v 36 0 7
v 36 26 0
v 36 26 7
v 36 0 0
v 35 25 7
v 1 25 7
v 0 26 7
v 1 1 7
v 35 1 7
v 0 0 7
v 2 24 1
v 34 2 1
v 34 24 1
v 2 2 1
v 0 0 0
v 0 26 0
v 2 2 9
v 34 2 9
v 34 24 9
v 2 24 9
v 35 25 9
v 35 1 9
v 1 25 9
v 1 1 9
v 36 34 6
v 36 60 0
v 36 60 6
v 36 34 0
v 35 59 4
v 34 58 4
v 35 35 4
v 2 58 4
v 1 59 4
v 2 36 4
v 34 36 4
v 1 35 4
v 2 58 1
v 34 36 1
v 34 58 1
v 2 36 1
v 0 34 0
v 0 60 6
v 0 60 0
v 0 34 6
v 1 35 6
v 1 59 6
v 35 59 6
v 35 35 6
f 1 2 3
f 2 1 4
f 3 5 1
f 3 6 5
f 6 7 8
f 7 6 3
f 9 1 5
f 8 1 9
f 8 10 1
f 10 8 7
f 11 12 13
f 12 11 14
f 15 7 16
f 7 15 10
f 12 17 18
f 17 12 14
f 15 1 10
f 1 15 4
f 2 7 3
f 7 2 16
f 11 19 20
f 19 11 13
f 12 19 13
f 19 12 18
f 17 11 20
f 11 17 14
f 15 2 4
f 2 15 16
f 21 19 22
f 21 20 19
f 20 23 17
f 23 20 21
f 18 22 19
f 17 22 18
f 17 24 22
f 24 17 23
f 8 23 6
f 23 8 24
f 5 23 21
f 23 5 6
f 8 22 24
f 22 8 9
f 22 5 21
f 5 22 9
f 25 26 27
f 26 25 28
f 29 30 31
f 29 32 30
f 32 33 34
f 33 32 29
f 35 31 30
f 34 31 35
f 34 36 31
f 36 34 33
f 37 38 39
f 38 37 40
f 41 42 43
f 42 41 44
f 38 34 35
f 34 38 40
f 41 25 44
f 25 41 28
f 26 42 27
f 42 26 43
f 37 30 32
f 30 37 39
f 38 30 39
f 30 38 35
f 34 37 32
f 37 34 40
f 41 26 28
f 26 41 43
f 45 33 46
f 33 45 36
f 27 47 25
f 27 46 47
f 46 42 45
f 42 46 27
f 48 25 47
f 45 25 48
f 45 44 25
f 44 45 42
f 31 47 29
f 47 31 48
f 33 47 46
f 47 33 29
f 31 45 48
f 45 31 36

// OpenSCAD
/*
***************************************************************************  
**  Yet Another Parameterised Projectbox library
**
**  Version "v0.9 (30-12-2021)"
**
**  Copyright (c) 2021, 2022 Willem Aandewiel
**
**  TERMS OF USE: MIT License. See bottom offile.                                                            
***************************************************************************      
*/
//---------------------------------------------------------
// This design is parameterized based on the size of a PCB.
//---------------------------------------------------------
// Note: length/lengte refers to X axis, 
//       width/breedte to Y, 
//       height/hoogte to Z

/*
      padding-back|<------pcb length --->|<padding-front
                            RIGHT
        0    X-as ---> 
        +----------------------------------------+   ---
        |                                        |    ^
        |                                        |   padding-right 
        |                                        |    v
        |    -5,y +----------------------+       |   ---              
 B    Y |         | 0,y              x,y |       |     ^              F
 A    - |         |                      |       |     |              R
 C    a |         |                      |       |     | pcb width    O
 K    s |         |                      |       |     |              N
        |         | 0,0              x,0 |       |     v              T
      ^ |    -5,0 +----------------------+       |   ---
      | |                                        |    padding-left
      0 +----------------------------------------+   ---
        0    X-as --->
                          LEFT
*/

//-- whitch half do you want to print?
printTop          = true;
printBottom       = true;

//-- Edit these parameters for your own board dimensions
wall_thickness        = 2.0;
bottomPlane_thickness = 1.0;
topPlane_thickness    = 1.0;

//-- Total height of box = bottomPlane_thickness + topPlane_thickness 
//--                     + bottomWall_height + topWall_height
bottomWall_height = 6;
topWall_height    = 5;

//-- ridge where bottom and top off box can overlap
//-- Make sure this isn't less than topWall_height
ridge_height      = 2;


//-- pcb dimensions
pcb_length        = 30;
pcb_width         = 20;
pcb_thickness     = 1.5;

//-- How much the PCB needs to be raised from the bottom
//-- to leave room for solderings and whatnot
standoff_height   = 4.0;
pin_diameter      = 1.0;
standoff_diameter = 3;
                            
//-- padding between pcb and inside wall
padding_front = 1;
padding_back  = 1;
padding_right = 1;
padding_left  = 1;


//-- D E B U G ----------------------------
show_side_by_side = true;       //-> true
showTop           = true;       //-> true
colorTop          = "yellow";   
showBottom        = true;       //-> true
colorBottom       = "white";
showPCB           = false;      //-> false
showMarkers       = false;      //-> false
intersect         = 0;  //-> 0=none (>0 from front, <0 from back)
//-- D E B U G ----------------------------

/*
********* don't change anything below this line ***************
*/

//-- constants, do not change
yappRectOrg       = 0;
yappRectCenter    = 1;
yappCircleCenter  = 2;
yappBoth          = 0;
yappTopOnly       = 1;
yappBottomOnly    = 2;
yappHole          = 0;
yappPin           = 1;

//-- pcb_standoffs  -- origin is pcb-0,0
pcbStands = [//[ [0]posx, [1]posy
             //       , [2]{yappBoth|yappTopOnly|yappBottomOnly}
             //       ,  [3]{yappHole|yappPin} ]
//               [3,  3, yappBoth, yappHole] 
//              ,[3,  pcb_width-3, yappBoth, yappPin]
             ];

//-- front plane  -- origin is pcb-0,0 (red)
cutoutsFront = [//[ [0]pcb_y, [1]pcb_z, [2]width, [3]height
                //      , [4]{yappRectOrg | yappRectCenterd | yappCircleCenter} ]
//                 [(pcb_width/2)-(12/2), -5, 12, 9, yappRectOrg]
//               , [10, 0, 12.5, 7, yappCircleCenter]
                ];

//-- back plane   -- origin is pcb-0,0 (blue)
cutoutsBack = [//[ [0]pcb_y, [1]pcb_z, [2]width, [3]height
               //     , [4]{yappRectOrg | yappRectCenterd | yappCircleCenter} ]
//                  [0, 0, 8, 5]
//                , [0, 2, 8, 5]
               ];

//-- top plane    -- origin is pcb-0,0
cutoutsTop = [//[ [0]pcb_x,  [1]pcb_y, [2]width, [3]length
              //    , [4]{yappRectOrg | yappRectCenterd | yappCircleCenter} ]
//                  [0, 6, (pcb_length-12), 4, yappRectOrg]
//                , [pcb_width-4, 6, pcb_length-12, 4, yappCircel]
//             // , [0, 5, 8, 4, yappRectCenter]
              ];

//-- bottom plane -- origin is pcb-0,0
cutoutsBottom = [//[ pcb_x,  pcb_y, width, length
                 //   , [4]{yappRectOrg | yappRectCenter | yappCircleCenter} ]
//                   [0, 6, (pcb_length-12), 5, true]
//                 , [pcb_width-5, 6, pcb_length-12, 5, false]
                 ];

//-- left plane   -- origin is pcb-0,0
cutoutsLeft = [//[[0]x_pos,  [1]z_pos, [2]width, [3]height ]
               //   , [4]{yappRectOrg | yappRectCenter | yappCircleCenter} ]
//                [0, 10, 5, 2]
//              , [pcb_length-5, 6, 7,7]
               ];

//-- right plane   -- origin is pcb-0,0
cutoutsRight = [//[[0]x_pos,  [1]z_pos, [2]width, [3]height ]
               //   , [4]{yappRectOrg | yappRectCenter | yappCircleCenter} ]
//                 [0, 1, 5, 2]
                 ];

//-- origin of labels is box [0,0]
labelsTop = [// [ x_pos, y_pos, orientation, size, "text" ]
              [10, 10, 0, 5, "TextLabel" ]
            ];

//-------------------------------------------------------------------

// Calculated globals
//pin_height = bottomWall_height + topWall_height - standoff_height; 

module pcb(posX, posY, posZ)
{
  difference()
  {
    translate([posX, posY, posZ])
    {
      color("red", 0.1)
        cube([pcb_length, pcb_width, pcb_thickness]);
    
      if (showMarkers)
      {
        markerHeight=bottomPlane_thickness+bottomWall_height+pcb_thickness;
    
        translate([0, 0, 0])
          color("black")
            %cylinder(
              r = .5,
              h = markerHeight,
              center = true,
              $fn = 20);

        translate([0, pcb_width, 0])
          color("black")
            %cylinder(
              r = .5,
              h = markerHeight,
              center = true,
              $fn = 20);

        translate([pcb_length, pcb_width, 0])
          color("black")
            %cylinder(
              r = .5,
              h = markerHeight,
              center = true,
              $fn = 20);

        translate([pcb_length, 0, 0])
          color("black")
            %cylinder(
              r = .5,
              h = markerHeight,
              center = true,
              $fn = 20);

        translate([((box_length-(wall_thickness*2))/2), 0, pcb_thickness])
          rotate([0,90,0])
            color("red")
              %cylinder(
                r = .5,
                h = box_length+(wall_thickness*2),
                center = true,
                $fn = 20);
    
        translate([((box_length-(wall_thickness*2))/2), pcb_width, pcb_thickness])
          rotate([0,90,0])
            color("red")
              %cylinder(
                r = .5,
                h = box_length+(wall_thickness*2),
                center = true,
                $fn = 20);
                
      } // show_markers
    } // translate
    
    if (intersect < 0)
    {
      translate([box_length+intersect, -1, -1])
        cube([box_length, box_width+2, box_height+2], false);
    }
    else if (intersect > 0)
    {
      translate([intersect-box_length, -1, -1])
        cube([box_length, box_width+2, box_height+2], false);
    }
    
  } // intersect
  
} // pcb()


module halfBox(do_show, do_color, width, length, wallHeight, plane_thickness) 
{
  // Floor
  color(do_color)
    cube([length, width, plane_thickness]);
  
  if (do_show)
  {
    color(do_color)
    {
    // Left wall
    translate([0, 0, plane_thickness])
        cube([
            length,
            wall_thickness,
            wallHeight]);
    
    // Right wall
    translate([0, width-wall_thickness, plane_thickness])
        cube([
            length,
            wall_thickness,
            wallHeight]);
   
    // Rear wall
    translate([length - wall_thickness, wall_thickness, plane_thickness])
        cube([
            wall_thickness,
            width - 2 * wall_thickness,
            wallHeight]);
   
    // Front wall
    translate([0, wall_thickness, plane_thickness])
        cube([
            wall_thickness,
            width - 2 * wall_thickness,
            wallHeight]);
            
     } // color
  } // do_show
  
} // halfBox()

        
module pcb_standoff(color, height, type) 
{
        module standoff(color)
        {
          color(color,1.0)
            cylinder(
              r = standoff_diameter / 2,
              h = height,
              center = false,
              $fn = 20);
        } // standoff()
        
        module stand_pin(color)
        {
          color(color, 1.0)
            cylinder(
              r = pin_diameter / 2,
              h = (pcb_thickness*2)+standoff_height,
              center = false,
              $fn = 20);
        } // stand_pin()
        
        module stand_hole(color)
        {
          color(color, 1.0)
            cylinder(
              r = (pin_diameter / 2)+.1,
              h = (pcb_thickness*2)+height,
              center = false,
              $fn = 20);
        } // standhole()
        
        if (type == 1)  // pin
        {
         standoff(color);
         stand_pin(color);
        }
        else            // hole
        {
          difference()
          {
            standoff(color);
            stand_hole(color);
          }
        }
        
} // pcb_standoff()


module cutoutSquare(color, w, h) 
{
  color(color, 1)
    cube([wall_thickness+2, w, h]);
  
} // cutoutSquare()


//===========================================================
module bottom_case() 
{
    floor_width = pcb_length + padding_front + padding_back + wall_thickness * 2;
    floor_length = pcb_width + padding_left + padding_right + wall_thickness * 2;
    
    module box() 
    {
      halfBox(showBottom, colorBottom, floor_length, floor_width, bottomWall_height, bottomPlane_thickness);        
      
      if (showBottom)
      {
        color(colorBottom)
        {
        // front Ridge
        translate([
            wall_thickness / 2,
            wall_thickness / 2,
            bottomPlane_thickness + bottomWall_height])
              cube([
                wall_thickness / 2,
                floor_length - wall_thickness,
                ridge_height]);
     
        // back Ridge
        translate([
            floor_width - wall_thickness,
            wall_thickness / 2,
            bottomPlane_thickness + bottomWall_height])
              cube([
                wall_thickness / 2,
                floor_length - wall_thickness,
                ridge_height]);
                
        // right Ridge
        translate([
            wall_thickness,
            floor_length - wall_thickness,
            bottomPlane_thickness + bottomWall_height])
              cube([
                floor_width - wall_thickness * 2,
                wall_thickness / 2,
                ridge_height]);
              
        // left Ridge
        translate([
            wall_thickness,
            wall_thickness / 2,
            bottomPlane_thickness + bottomWall_height])
              cube([
                floor_width - 2 * wall_thickness,
                wall_thickness / 2,
                ridge_height]);
       
       }  // color
       
     } // showBottom
     
    } //  box()
        
    // Place the standoffs and through-PCB pins in the Bottom Box
    module pcb_holder() 
    {        
      //-- place pcb Standoff's
      for ( stand = pcbStands )
      {
        //-- [0]posx, [1]posy, [2]{yappBoth|yappTopOnly|yappBottomOnly}
        //--          , [3]{yappHole, YappPin}
        posx=pcbX+stand[0];
        posy=pcbY+stand[1];
        if (stand[2] != yappTopOnly)
        {
          translate([posx, posy, bottomPlane_thickness])
            pcb_standoff("green", standoff_height, stand[3]);
        }
      }
        
    } // pcb_holder()
   
    //-- place cutOuts in Bottom Box
    difference() 
    {
      box();        
      
      //-- [0]pcb_y, [1]pcb_z, [2]width, [3]height,
      //--                   [4]{yappRectOrg | yappRectCenterd | yappCircleCenter} 
      for ( cutOut = cutoutsFront )
      {

        if (cutOut[4]==yappRectOrg)
        {
          posy=pcbY+cutOut[0];
          posz=pcbZ+cutOut[1];
          translate([box_length-wall_thickness, posy, posz])
            cutoutSquare("red", cutOut[2], cutOut[3]+bottomWall_height);
        }
        else if (cutOut[4]==yappRectCenter)
        {
          posy=pcbY+cutOut[0]-(cutOut[2]/2);
          posz=pcbZ+cutOut[1]-(cutOut[3]/2);
          translate([box_length-wall_thickness, posy, posz])
            cutoutSquare("red", cutOut[2], cutOut[3]+bottomWall_height);
        }
        else if (cutOut[4]==yappCircleCenter)
        {
          posy=pcbY+cutOut[0]-(cutOut[2]/2);
          posz=pcbZ+cutOut[1];
          translate([box_length-wall_thickness, posy, posz])
            rotate([0,90,0])
              color("red")
                cylinder(h=wall_thickness, d=cutOut[2], $fn=20);
        }
      }
      
      //--[ [0]pcb_y, [1]pcb_z, [2]width, [3]height
      //--        , {yappRectOrg | yappRectCenter | yappCircleCenter} ]
      for ( cutOut = cutoutsBack )
      {
        if (cutOut[4]==yappRectOrg)
        {
          posy=pcbY+cutOut[0];
          posz=pcbZ+cutOut[1];
          translate([0, posy, posz])
            cutoutSquare("red", cutOut[2], cutOut[3]+bottomWall_height);
        }
        else if (cutOut[4]==yappRectCenter)
        {
          posy=pcbY+cutOut[0]-(cutOut[2]/2);
          posz=pcbZ+cutOut[1]-(cutOut[3]/2);
          translate([0, posy, posz])
            cutoutSquare("red", cutOut[2], cutOut[3]+bottomWall_height);
        }
        else if (cutOut[4]==yappCircleCenter)
        {
          posy=pcbY+cutOut[0]-(cutOut[2]/2);  // width = diameter
          posz=pcbZ+cutOut[1];
          translate([-1, posy, posz])
            rotate([0,90,0])
              color("red")
                cylinder(h=wall_thickness+2, d=cutOut[2], $fn=20);
        }
      }
   
      //-- place cutOuts in Left Plane Bottom Box
      
      //-- [0]pcb_x, [1]pcb_z, [2]width, [3]height, 
      //--                      {yappRectOrg | yappRectCenterd | yappCircleCenter}           
      //         
      //      [0]pos_x->|
      //                |
      //  F  |          +-----------+  ^ 
      //  R  |          |           |  |
      //  O  |          |<[2]length>|  [3]height
      //  N  |          +-----------+  v   
      //  T  |            ^
      //     |            | [1]z_pos
      //     |            v
      //     +----------------------------- pcb(0,0)
      //
      for ( cutOut = cutoutsLeft )
      {
        //echo("bottomLeft:", cutOut);
        if (cutOut[4]==yappRectOrg)
        {
          posx=pcbX+cutOut[0];
          posz=pcbZ+cutOut[1];
          //echo("(org) - pcbX:",pcbX,", posx:", posx,", pcbZ:",pcbZ,", posz:",posz);
          translate([posx, wall_thickness*2, posz])
            rotate([0,0,270])
              cutoutSquare("brown", cutOut[2], cutOut[3]);
        }
        else if (cutOut[4]==yappRectCenter)
        {
          posx=pcbX+cutOut[0]-(cutOut[2]/2);
          posz=pcbZ+cutOut[1]-(cutOut[3]/2);
          //echo("(center) - pcbX:",pcbX,", posx:", posx,", pcbZ:",pcbZ,", posz:",posz);
          translate([posx, wall_thickness+1, posz])
            rotate([0,0,270])
            //cutoutSquare("brown", cutOut[2], cutOut[3]+bottomWall_height);
              cutoutSquare("brown", cutOut[2], cutOut[3]);
        }
        else if (cutOut[4]==yappCircleCenter)
        {
          posx=pcbX+cutOut[0];
          posz=pcbZ+cutOut[1];
          echo("(circle) - pcbX:",pcbX,", posx:", posx,", pcbZ:",pcbZ,", posz:",posz);
          translate([posx, wall_thickness+1, posz])
            rotate([90,0,0])
              color("brown")
                cylinder(h=wall_thickness+2, d=cutOut[2], $fn=20);
        }
        
      } // for cutOut's ..
      
      //-- [0]pcb_x, [1]pcb_z, [2]width, [3]height, 
      //--                {yappRectOrg | yappRectCenterd | yappCircleCenter}           
      for ( cutOut = cutoutsRight )
      {

        if (cutOut[4]==yappRectOrg)
        {
          posx=pcbX+cutOut[0];
          posz=pcbZ+cutOut[1];
          translate([posx, (wall_thickness*2)+pcb_width+padding_left+padding_right, posz])
            rotate(270)
              cutoutSquare("AntiqueWhite", cutOut[2], cutOut[3]);
        }
        else if (cutOut[4]==yappRectCenter)
        {
          posx=pcbX+cutOut[0]-(cutOut[2]/2);
          posz=pcbZ+cutOut[1]-(cutOut[3]/2);;
          translate([posx, (wall_thickness*2)+pcb_width+padding_left+padding_right, posz])
            rotate([0,0,270])
              cutoutSquare("AntiqueWhite", cutOut[2], cutOut[3]+bottomWall_height);
        }
        else if (cutOut[4]==yappCircleCenter)
        {
          posx=pcbX+cutOut[0];
          posz=pcbZ+cutOut[1];
          translate([posx, (wall_thickness*2)+pcb_width+padding_left+padding_right, posz])
            rotate([90,0,0])
              color("AntiqueWhite")
                cylinder(h=wall_thickness+2, d=cutOut[2], $fn=20);
        }

      } // for ..

      //-- place cutOuts in Bottom Box
      
      // [0]pcb_x, [1]pcb_x, [2]width, [3]length, [4]{yappRectOrg | yappRectCenter | yappCircleCenter}
      for ( cutOut = cutoutsBottom )
      {
        if (cutOut[4]==yappRectOrg)  // org pcb_x/y
        {
          posx=pcbX+cutOut[0];
          posy=pcbY+cutOut[1];
          translate([posx, posy, 0])
            linear_extrude(bottomPlane_thickness)
              square([cutOut[3],cutOut[2]], false);
        }
        else if (cutOut[4]==yappRectCenter)  // center around x/y
        {
          posx=pcbX+(cutOut[0]-(cutOut[3]/2));
          posy=pcbY+(cutOut[1]-(cutOut[2]/2));
          translate([posx, posy, 0])
            linear_extrude(bottomPlane_thickness)
              square([cutOut[3],cutOut[2]], false);
        }
        else if (cutOut[4]==yappCircleCenter)  // circle centered around x/y
        {
          posx=pcbX+cutOut[0];
          posy=pcbY+(cutOut[1]+cutOut[2]/2)-cutOut[2]/2;
          translate([posx, posy, 0])
            linear_extrude(bottomPlane_thickness)
              circle(d=cutOut[2], $fn=20);
        }
      }
 
    } // diff 
    
    pcb_holder();
    
} //  bottom_case() 


//===========================================================
module top_case() 
{
    floor_width = pcb_length + padding_front + padding_back + wall_thickness * 2;
    floor_length = pcb_width + padding_left + padding_right + wall_thickness * 2;
  
    module box() 
    {
      difference() 
      {
        halfBox(showTop, colorTop, floor_length, floor_width, topWall_height 
                                            -ridge_height, topPlane_thickness);
        for ( label = labelsTop )
        {
          // [0]x_pos, [1]y_pos, [2]orientation, [3]font, [4]size, [5]"text" 

          translate([label[0], box_width-label[1], 0]) 
          {
            linear_extrude(0.5) 
            {
              rotate([0,0,(180-label[2])])
              {
                mirror(v=[1,0,0]) 
                {
                  text(label[5]
                        , font=label[3]
                        , size=label[4]
                        , direction="ltr"
                        , halign="left"
                        , valign="bottom");
                } // mirror..
              } // rotate
            } // extrude
          } // translate
        } // for labels...

      } // diff

      if (showTop)
      {
        color(colorTop)
        {
      // front Ridge
      translate([
            0,
            0,
            topPlane_thickness + topWall_height - ridge_height])
            cube([
                wall_thickness / 2,
                floor_length,
                ridge_height]);
       
      // back Ridge
      translate([
            floor_width - wall_thickness / 2,
            0,
            topPlane_thickness + topWall_height - ridge_height])
            cube([
                wall_thickness / 2,
                floor_length,
                ridge_height]);
               
      // right Ridge
      translate([
            wall_thickness / 2,
            floor_length - wall_thickness / 2,
            topPlane_thickness + topWall_height - ridge_height])
            cube([
                floor_width - wall_thickness,
                wall_thickness / 2,
                ridge_height]);
              
      // left Ridge
      translate([
            wall_thickness / 2,
            0,
            topPlane_thickness + topWall_height - ridge_height])
            cube([
                floor_width - wall_thickness,
                wall_thickness / 2,
                ridge_height]);        

        } // color
        
      } // showTop

    } // box()

    module pcb_receivers() 
    {        
      //-- place pcb Standoff-receivers
      difference()
      {
        for ( receiver = pcbStands )
        {
          //-- [0]posx, [1]posy, [2]{yappBoth|yappTopOnly|yappBottomOnly}
          //--          , [3]{yappHole|YappPin}
          //
          //-- stands in Top are alway's holes!
          posx=pcbX+receiver[0];
          posy=(pcbY+receiver[1]);
          height=(bottomWall_height+topWall_height)
                        -(standoff_height+pcb_thickness);
          if (receiver[2] != yappBottomOnly)
          {
            translate([posx, posy, topPlane_thickness])
              pcb_standoff("yellow", height, yappHole);
          }
        }
        if (intersect < 0)
        {
          translate([box_length+intersect, -1, -1])
          color("gray", 0.2)
            cube([box_length, box_width+2, box_height+2], false);
        }
        else if (intersect > 0)
        {
          translate([intersect-box_length, -1, -1])
          color("gray", 0.2)
            cube([box_length, box_width+2, box_height+2], false);
        }
        
      } // intersect.
        
    } // pcb_receiver()
   
    //-- place front & back cutOuts in Top Plane
    difference() 
    {
      box();        
      
      //-- place cutOuts in Top Plane
      
      //-- [0]pcb_x,  [1]pcb_y, [2]width, [3]length
      //--          , [4]{yappRectOrg | yappRectCenter | yappCircleCenter}
      for ( cutOut = cutoutsTop )
      {
        //-- left 0,0
        if (cutOut[4]==yappRectOrg)
        {
          posx=pcbX+cutOut[0];
          //-- pcbYtop=wall_thickness+pcb_width+padding_right;
          posy=pcbYtop-(cutOut[1]+cutOut[2]);
          translate([posx, posy, 0])
            linear_extrude(topPlane_thickness+0.0001)
              color("white")
                square([cutOut[3],cutOut[2]], false);
        }
        else if (cutOut[4]==yappRectCenter)  //  center araound pcb_x/y
        {
          posx=pcbX+(cutOut[0]-(cutOut[3]/2));
          posy=(pcbY-padding_left)+padding_right+(pcb_width-(cutOut[2]/1)-(cutOut[1]-(cutOut[2]/2)));
          translate([posx, posy, 0])
            linear_extrude(topPlane_thickness+0.0001)
              color("white")
                square([cutOut[3],cutOut[2]], false);
          }
        else if (cutOut[4]==yappCircleCenter)  // circle centered around x/y
        {
          posx=pcbX+cutOut[0];
          posy=(pcbY-padding_left)+padding_right+(pcb_width-(cutOut[2]/2)-(cutOut[1]-(cutOut[2]/2)));
          translate([posx, posy, 0])
            linear_extrude(bottomPlane_thickness+1)
              color("white")
                circle(d=cutOut[2], $fn=20);
        }
      }

      // [0]pcb_y, [1]pcb_z, [2]width, [3]height, [4]{yappRectOrg | yappRectCenterd | yappCircleCenter} 
      for ( cutOut = cutoutsFront )
      {
        if (cutOut[4]==yappRectOrg)
        {
          posy=box_width-(wall_thickness+padding_left+cutOut[0])-cutOut[2];
          posz=topZpcb-cutOut[3];
          translate([box_length-(wall_thickness+2), posy, posz])
            cutoutSquare("gray", cutOut[2], cutOut[3]);
        }
        else if (cutOut[4]==yappRectCenter)
        {
          posy=box_width-(wall_thickness+padding_left+cutOut[0])-(cutOut[2]/2);
          posz=topZpcb-cutOut[1]-(cutOut[3]/2);
          translate([box_length-wall_thickness, posy, posz])
            cutoutSquare("gray", cutOut[2], cutOut[3]);
        }
        else if (cutOut[4]==yappCircleCenter)
        {
          posy=box_width-(pcbY+(cutOut[0]-(cutOut[2]/2)));
          posz=topZpcb-cutOut[1];
          translate([box_length, posy, posz])
            rotate([0,270,0])
              color("gray")
                cylinder(h=wall_thickness, d=cutOut[2], $fn=20);
        }
      }
      
      //-- [0]pcb_y, [1]pcb_z, [2]width, [3]height, 
      //--  [4]{yappRectOrg | yappRectCenterd | yappCircleCenter} 
      for ( cutOut = cutoutsBack )
      {
        //-- calculate part that sticks out of the bottom
        //       +=============== topPlane_thickness
        //       |     +---+          ---
        //       |     |   |           ^  height to calculate
        //       +-----+   +----       x 
        //       |     |   |           | cutOut_height
        //       |     |   |           v
        //       |     +---+          ---
        //       |                     floor_z
        //       |   ============ pcb ---
        //       |           []   stand
        //       |           []
        //       +=============== bottomPlane_thickness

        if (cutOut[4]==yappRectOrg)
        {
          posy=box_width-(wall_thickness+padding_left+cutOut[0])-cutOut[2];
          posz=topZpcb-cutOut[3];
          translate([0, posy, posz])
            cutoutSquare("green", cutOut[2], cutOut[3]+5);
        }
        else if (cutOut[4]==yappRectCenter)
        {
          posy=box_width-(wall_thickness+padding_left+cutOut[0]+(cutOut[2]/2));
          posz=topZpcb-(cutOut[1]+(cutOut[3]/2));
          translate([0, posy, posz])
            cutoutSquare("green", cutOut[2], cutOut[3]);
        }
        else if (cutOut[4]==yappCircleCenter)
        {
          posy=box_width-(pcbY+(cutOut[0]+(cutOut[2]/2)));
          posz=(bottomWall_height+topWall_height+topPlane_thickness)
                        -(standoff_height+pcb_thickness);
          posz=topZpcb-cutOut[1];
          posy=box_width-(pcbY+(cutOut[0]-(cutOut[2]/2)));
          posz=topZpcb-cutOut[1];
          translate([1, posy, posz])
            rotate([0,270,0])
              color("green")
                cylinder(h=wall_thickness*2, d=cutOut[2], $fn=20);
        }
      }
   
      //-- place cutOuts in left plane
      //-- [0]pcb_x, [1]pcb_z, [2]width, [3]height, {yappRectOrg | yappRectCenterd | yappCircleCenter}           
      //         
      //      [0]pos_x->|
      //                |
      //  F  |          +-----------+  ^ 
      //  R  |          |           |  |
      //  O  |          |<[2]length>|  [3]height
      //  N  |          +-----------+  v   
      //  T  |            ^
      //     |            | [1]z_pos
      //     |            v
      //     +----------------------------- pcb(0,0)
      //
      for ( cutOut = cutoutsLeft )
      {

        if (cutOut[4]==yappRectOrg)
        {
          posx=pcbX+cutOut[0];
          posz=topZpcb-cutOut[1];
          translate([posx, (wall_thickness+2)+padding_left+pcb_width+padding_right, posz])
            rotate(270)
              cutoutSquare("black", cutOut[2], cutOut[3]);
        }
        else if (cutOut[4]==yappRectCenter)
        {
          posx=pcbX+cutOut[0]-(cutOut[2]/2);
          posz=topZpcb-(cutOut[1]+cutOut[2]/2);
          translate([posx, (wall_thickness+2)+padding_left+pcb_width+padding_right, posz])
            rotate(270)
              cutoutSquare("black", cutOut[2], cutOut[3]);
        }
        else if (cutOut[4]==yappCircleCenter)
        {
          posx=pcbX+cutOut[0];
          posz=topZpcb-cutOut[1];
          translate([posx, (wall_thickness+2)+padding_left+pcb_width+padding_right, posz])
            rotate([90,0,0])
              color("black")
                cylinder(h=wall_thickness+2, d=cutOut[2], $fn=20);
        }
        
      } //   for cutOut's ..

      //-- [0]pcb_x, [1]pcb_z, [2]width, [3]height,
      //--                      {yappRectOrg | yappRectCenterd | yappCircleCenter}
      for ( cutOut = cutoutsRight )
      {
        if (cutOut[4]==yappRectOrg)
        {
          posx=pcbX+cutOut[0];
          //-- calculate part that sticks out of the bottom
          start_z=pcbZ+cutOut[1];
          used_height=start_z+cutOut[3];
          rest_height=used_height-(bottomPlane_thickness+standoff_height+bottomWall_height);
          rest_height=0;
          posz=(topWall_height+topPlane_thickness)-(rest_height+ridge_height);
          translate([posx, wall_thickness+1, posz])
            rotate(270)
              cutoutSquare("purple", cutOut[2], cutOut[3]);
        }
        else if (cutOut[4]==yappRectCenter)
        {
          posx=pcbX+cutOut[0]-(cutOut[2]/2);
          posz=topZpcb-(cutOut[1]+cutOut[2]/2);
          //-- calculate part that sticks out of the bottom
          //used_height=pcbZ+cutOut[1]+cutOut[2];
          //rest_height=used_height-(bottomPlane_thickness+standoff_height+bottomWall_height);
          translate([posx, wall_thickness+1, posz])
            rotate(270)
              cutoutSquare("purple", cutOut[2], cutOut[3]);
        }
        else if (cutOut[4]==yappCircleCenter)
        {
          posx=pcbX+cutOut[0];
          posz=topZpcb-cutOut[1];
          translate([posx, wall_thickness+1, posz])
            rotate([90,0,0])
              color("purple")
                cylinder(h=wall_thickness+2, d=cutOut[2], $fn=20);
        }
      } //  for ...

    } // diff 
    
    shift=(pcbY+pcb_width+padding_right+(wall_thickness*1))*-1;
    mirror([1,1,0])
      rotate([0,0,270])
        translate([0,shift,0])
          pcb_receivers();
    
} //  top_case() 

module showOrientation()
{
  translate([-10, 10, 0])
    rotate(90)
     linear_extrude(1) 
          %text("BACK"
            , font="Liberation Mono:style=bold"
            , size=8
            , direction="ltr"
            , halign="left"
            , valign="bottom");

  translate([box_length+15, 10, 0])
    rotate(90)
     linear_extrude(1) 
          %text("FRONT"
            , font="Liberation Mono:style=bold"
            , size=8
            , direction="ltr"
            , halign="left"
            , valign="bottom");

  translate([15, -15, 0])
     linear_extrude(1) 
          %text("LEFT"
            , font="Liberation Mono:style=bold"
            , size=8
            , direction="ltr"
            , halign="left"
            , valign="bottom");

} // showOrientation()


//========= MAIN CALL's ===========================================================

pcbX=wall_thickness+padding_back;
pcbY=wall_thickness+padding_left;
pcbYtop=wall_thickness+pcb_width+padding_right;
pcbZ=bottomPlane_thickness+standoff_height+pcb_thickness;
topZpcb=(bottomWall_height+topWall_height+bottomPlane_thickness)-(standoff_height);
topZpcb=(bottomWall_height+topWall_height+topPlane_thickness)
                        -(standoff_height+pcb_thickness);

box_width=(pcb_width+(wall_thickness*2)+padding_left+padding_right);
box_length=(pcb_length+(wall_thickness*2)+padding_front+padding_back);
box_height=bottomPlane_thickness+bottomWall_height+topWall_height+topPlane_thickness;

echo("===========================");
echo("*       pcbX [", pcbX,"]");
echo("*       pcbY [", pcbY,"]");
echo("*    pcbYtop [", pcbYtop,"]");
echo("*       pcbZ [", pcbZ,"]");
echo("*    topZpcb [", topZpcb,"]");
echo("*  box width [", box_width,"]");
echo("* box length [", box_length,"]");
echo("* box height [", box_height,"]");
echo("===========================");

if (showMarkers)
{
  //-- box[0,0] marker --
  translate([0, 0, 8])
    color("blue")
      %cylinder(
              r = .5,
              h = 20,
              center = true,
              $fn = 20);
} //  showMarkers


if (printBottom) 
{
  if (showPCB) %pcb(pcbX, pcbY, bottomPlane_thickness+standoff_height);
  difference()
  {
    bottom_case();
    if (intersect < 0)
    {
      translate([box_length+intersect, -1, -1])
        cube([box_length, box_width+2, box_height+2], false);
    }
    else if (intersect > 0)
    {
      translate([intersect-box_length, -1, -1])
        cube([box_length, box_width+2, box_height+2], false);
    }
  }
  
  showOrientation();
  
} // if printBottom ..


if (printTop)
{
  if (show_side_by_side)
  {
    translate([
      0,
      5 + pcb_width + standoff_diameter + padding_front + padding_right + wall_thickness * 2,
      0])
    {
      if (showPCB) 
      {
        posZ=(bottomWall_height+topWall_height+bottomPlane_thickness)
                        -(standoff_height);
        rotate([0,180,0])
          %pcb((pcb_length+wall_thickness+padding_front)*-1,
               padding_right+wall_thickness,
               (posZ)*-1);
      }
      difference()
      {
        top_case();
        if (intersect < 0)
        {
          translate([box_length+intersect, -1, -1])
            cube([box_length, box_width+2, box_height+2], false);
        }
        else if (intersect > 0)
        {
          translate([intersect-box_length, -1, -1])
            cube([box_length, box_width+2, box_height+2], false);
        }
      }
      if (showMarkers)
      {
        translate([pcbX, pcbYtop, 8])
          color("red")
            %cylinder(
              r = .5,
              h = 20,
              center = true,
              $fn = 20);
        
        translate([pcbX, pcbYtop-pcb_width, 8])
          color("red")
            %cylinder(
              r = .5,
              h = 20,
              center = true,
              $fn = 20);
        translate([pcbX+pcb_length, pcbYtop-pcb_width, 8])
          color("red")
            %cylinder(
              r = .5,
              h = 20,
              center = true,
              $fn = 20);
        
        translate([pcbX+pcb_length, pcbYtop, 8])
          color("red")
            %cylinder(
              r = .5,
              h = 20,
              center = true,
              $fn = 20);
              
      } // show_markers
      
      translate([box_length-15, box_width+15, 0])
        linear_extrude(1) 
          rotate(180)
          %text("LEFT"
            , font="Liberation Mono:style=bold"
            , size=8
            , direction="ltr"
            , halign="left"
            , valign="bottom");

    } // translate
  }
  else  //  show on top of each other
  {
    
    translate([
      0,
      (wall_thickness*2)+padding_left+pcb_width+padding_right,
      bottomPlane_thickness+bottomWall_height+topPlane_thickness+topWall_height
    ])
    {
      rotate([180,0,0])
      {
        difference()
        {
          top_case();
          if (intersect < 0)
          {
            translate([box_length+intersect, -1, -1])
              cube([box_length, box_width+2, box_height+2], false);
          }
          else if (intersect > 0)
          {
            translate([intersect-box_length, -1, -1])
              cube([box_length, box_width+2, box_height+2], false);
          }
        }
        if (showMarkers)
        {
          translate([pcbX, pcbYtop, 8])
            color("red")
              %cylinder(
                r = .5,
                h = 20,
                center = true,
                $fn = 20);
        
          translate([pcbX, pcbYtop-pcb_width, 8])
            color("red")
              %cylinder(
                r = .5,
                h = 20,
                center = true,
                $fn = 20);
          
          translate([pcbX+pcb_length, pcbYtop-pcb_width, 8])
            color("red")
              %cylinder(
                r = .5,
                h = 20,
                center = true,
                $fn = 20);
        
          translate([pcbX+pcb_length, pcbYtop, 8])
            color("red")
              %cylinder(
                r = .5,
                h = 20,
                center = true,
                $fn = 20);
                
        } // showMarkers
      } //  rotate
    } //  translate
  } // show "on-top"

} // printTop()

/*
****************************************************************************
*
* Permission is hereby granted, free of charge, to any person obtaining a
* copy of this software and associated documentation files (the
* "Software"), to deal in the Software without restriction, including
* without limitation the rights to use, copy, modify, merge, publish,
* distribute, sublicense, and/or sell copies of the Software, and to permit
* persons to whom the Software is furnished to do so, subject to the
* following conditions:
*
* The above copyright notice and this permission notice shall be included
* in all copies or substantial portions of the Software.
*
* THE SOFTWARE IS PROVIDED "AS IS", WITHOUT WARRANTY OF ANY KIND, EXPRESS
* OR IMPLIED, INCLUDING BUT NOT LIMITED TO THE WARRANTIES OF
* MERCHANTABILITY, FITNESS FOR A PARTICULAR PURPOSE AND NONINFRINGEMENT.
* IN NO EVENT SHALL THE AUTHORS OR COPYRIGHT HOLDERS BE LIABLE FOR ANY
* CLAIM, DAMAGES OR OTHER LIABILITY, WHETHER IN AN ACTION OF CONTRACT, TORT
* OR OTHERWISE, ARISING FROM, OUT OF OR IN CONNECTION WITH THE SOFTWARE OR
* THE USE OR OTHER DEALINGS IN THE SOFTWARE.
* 
****************************************************************************
*/
